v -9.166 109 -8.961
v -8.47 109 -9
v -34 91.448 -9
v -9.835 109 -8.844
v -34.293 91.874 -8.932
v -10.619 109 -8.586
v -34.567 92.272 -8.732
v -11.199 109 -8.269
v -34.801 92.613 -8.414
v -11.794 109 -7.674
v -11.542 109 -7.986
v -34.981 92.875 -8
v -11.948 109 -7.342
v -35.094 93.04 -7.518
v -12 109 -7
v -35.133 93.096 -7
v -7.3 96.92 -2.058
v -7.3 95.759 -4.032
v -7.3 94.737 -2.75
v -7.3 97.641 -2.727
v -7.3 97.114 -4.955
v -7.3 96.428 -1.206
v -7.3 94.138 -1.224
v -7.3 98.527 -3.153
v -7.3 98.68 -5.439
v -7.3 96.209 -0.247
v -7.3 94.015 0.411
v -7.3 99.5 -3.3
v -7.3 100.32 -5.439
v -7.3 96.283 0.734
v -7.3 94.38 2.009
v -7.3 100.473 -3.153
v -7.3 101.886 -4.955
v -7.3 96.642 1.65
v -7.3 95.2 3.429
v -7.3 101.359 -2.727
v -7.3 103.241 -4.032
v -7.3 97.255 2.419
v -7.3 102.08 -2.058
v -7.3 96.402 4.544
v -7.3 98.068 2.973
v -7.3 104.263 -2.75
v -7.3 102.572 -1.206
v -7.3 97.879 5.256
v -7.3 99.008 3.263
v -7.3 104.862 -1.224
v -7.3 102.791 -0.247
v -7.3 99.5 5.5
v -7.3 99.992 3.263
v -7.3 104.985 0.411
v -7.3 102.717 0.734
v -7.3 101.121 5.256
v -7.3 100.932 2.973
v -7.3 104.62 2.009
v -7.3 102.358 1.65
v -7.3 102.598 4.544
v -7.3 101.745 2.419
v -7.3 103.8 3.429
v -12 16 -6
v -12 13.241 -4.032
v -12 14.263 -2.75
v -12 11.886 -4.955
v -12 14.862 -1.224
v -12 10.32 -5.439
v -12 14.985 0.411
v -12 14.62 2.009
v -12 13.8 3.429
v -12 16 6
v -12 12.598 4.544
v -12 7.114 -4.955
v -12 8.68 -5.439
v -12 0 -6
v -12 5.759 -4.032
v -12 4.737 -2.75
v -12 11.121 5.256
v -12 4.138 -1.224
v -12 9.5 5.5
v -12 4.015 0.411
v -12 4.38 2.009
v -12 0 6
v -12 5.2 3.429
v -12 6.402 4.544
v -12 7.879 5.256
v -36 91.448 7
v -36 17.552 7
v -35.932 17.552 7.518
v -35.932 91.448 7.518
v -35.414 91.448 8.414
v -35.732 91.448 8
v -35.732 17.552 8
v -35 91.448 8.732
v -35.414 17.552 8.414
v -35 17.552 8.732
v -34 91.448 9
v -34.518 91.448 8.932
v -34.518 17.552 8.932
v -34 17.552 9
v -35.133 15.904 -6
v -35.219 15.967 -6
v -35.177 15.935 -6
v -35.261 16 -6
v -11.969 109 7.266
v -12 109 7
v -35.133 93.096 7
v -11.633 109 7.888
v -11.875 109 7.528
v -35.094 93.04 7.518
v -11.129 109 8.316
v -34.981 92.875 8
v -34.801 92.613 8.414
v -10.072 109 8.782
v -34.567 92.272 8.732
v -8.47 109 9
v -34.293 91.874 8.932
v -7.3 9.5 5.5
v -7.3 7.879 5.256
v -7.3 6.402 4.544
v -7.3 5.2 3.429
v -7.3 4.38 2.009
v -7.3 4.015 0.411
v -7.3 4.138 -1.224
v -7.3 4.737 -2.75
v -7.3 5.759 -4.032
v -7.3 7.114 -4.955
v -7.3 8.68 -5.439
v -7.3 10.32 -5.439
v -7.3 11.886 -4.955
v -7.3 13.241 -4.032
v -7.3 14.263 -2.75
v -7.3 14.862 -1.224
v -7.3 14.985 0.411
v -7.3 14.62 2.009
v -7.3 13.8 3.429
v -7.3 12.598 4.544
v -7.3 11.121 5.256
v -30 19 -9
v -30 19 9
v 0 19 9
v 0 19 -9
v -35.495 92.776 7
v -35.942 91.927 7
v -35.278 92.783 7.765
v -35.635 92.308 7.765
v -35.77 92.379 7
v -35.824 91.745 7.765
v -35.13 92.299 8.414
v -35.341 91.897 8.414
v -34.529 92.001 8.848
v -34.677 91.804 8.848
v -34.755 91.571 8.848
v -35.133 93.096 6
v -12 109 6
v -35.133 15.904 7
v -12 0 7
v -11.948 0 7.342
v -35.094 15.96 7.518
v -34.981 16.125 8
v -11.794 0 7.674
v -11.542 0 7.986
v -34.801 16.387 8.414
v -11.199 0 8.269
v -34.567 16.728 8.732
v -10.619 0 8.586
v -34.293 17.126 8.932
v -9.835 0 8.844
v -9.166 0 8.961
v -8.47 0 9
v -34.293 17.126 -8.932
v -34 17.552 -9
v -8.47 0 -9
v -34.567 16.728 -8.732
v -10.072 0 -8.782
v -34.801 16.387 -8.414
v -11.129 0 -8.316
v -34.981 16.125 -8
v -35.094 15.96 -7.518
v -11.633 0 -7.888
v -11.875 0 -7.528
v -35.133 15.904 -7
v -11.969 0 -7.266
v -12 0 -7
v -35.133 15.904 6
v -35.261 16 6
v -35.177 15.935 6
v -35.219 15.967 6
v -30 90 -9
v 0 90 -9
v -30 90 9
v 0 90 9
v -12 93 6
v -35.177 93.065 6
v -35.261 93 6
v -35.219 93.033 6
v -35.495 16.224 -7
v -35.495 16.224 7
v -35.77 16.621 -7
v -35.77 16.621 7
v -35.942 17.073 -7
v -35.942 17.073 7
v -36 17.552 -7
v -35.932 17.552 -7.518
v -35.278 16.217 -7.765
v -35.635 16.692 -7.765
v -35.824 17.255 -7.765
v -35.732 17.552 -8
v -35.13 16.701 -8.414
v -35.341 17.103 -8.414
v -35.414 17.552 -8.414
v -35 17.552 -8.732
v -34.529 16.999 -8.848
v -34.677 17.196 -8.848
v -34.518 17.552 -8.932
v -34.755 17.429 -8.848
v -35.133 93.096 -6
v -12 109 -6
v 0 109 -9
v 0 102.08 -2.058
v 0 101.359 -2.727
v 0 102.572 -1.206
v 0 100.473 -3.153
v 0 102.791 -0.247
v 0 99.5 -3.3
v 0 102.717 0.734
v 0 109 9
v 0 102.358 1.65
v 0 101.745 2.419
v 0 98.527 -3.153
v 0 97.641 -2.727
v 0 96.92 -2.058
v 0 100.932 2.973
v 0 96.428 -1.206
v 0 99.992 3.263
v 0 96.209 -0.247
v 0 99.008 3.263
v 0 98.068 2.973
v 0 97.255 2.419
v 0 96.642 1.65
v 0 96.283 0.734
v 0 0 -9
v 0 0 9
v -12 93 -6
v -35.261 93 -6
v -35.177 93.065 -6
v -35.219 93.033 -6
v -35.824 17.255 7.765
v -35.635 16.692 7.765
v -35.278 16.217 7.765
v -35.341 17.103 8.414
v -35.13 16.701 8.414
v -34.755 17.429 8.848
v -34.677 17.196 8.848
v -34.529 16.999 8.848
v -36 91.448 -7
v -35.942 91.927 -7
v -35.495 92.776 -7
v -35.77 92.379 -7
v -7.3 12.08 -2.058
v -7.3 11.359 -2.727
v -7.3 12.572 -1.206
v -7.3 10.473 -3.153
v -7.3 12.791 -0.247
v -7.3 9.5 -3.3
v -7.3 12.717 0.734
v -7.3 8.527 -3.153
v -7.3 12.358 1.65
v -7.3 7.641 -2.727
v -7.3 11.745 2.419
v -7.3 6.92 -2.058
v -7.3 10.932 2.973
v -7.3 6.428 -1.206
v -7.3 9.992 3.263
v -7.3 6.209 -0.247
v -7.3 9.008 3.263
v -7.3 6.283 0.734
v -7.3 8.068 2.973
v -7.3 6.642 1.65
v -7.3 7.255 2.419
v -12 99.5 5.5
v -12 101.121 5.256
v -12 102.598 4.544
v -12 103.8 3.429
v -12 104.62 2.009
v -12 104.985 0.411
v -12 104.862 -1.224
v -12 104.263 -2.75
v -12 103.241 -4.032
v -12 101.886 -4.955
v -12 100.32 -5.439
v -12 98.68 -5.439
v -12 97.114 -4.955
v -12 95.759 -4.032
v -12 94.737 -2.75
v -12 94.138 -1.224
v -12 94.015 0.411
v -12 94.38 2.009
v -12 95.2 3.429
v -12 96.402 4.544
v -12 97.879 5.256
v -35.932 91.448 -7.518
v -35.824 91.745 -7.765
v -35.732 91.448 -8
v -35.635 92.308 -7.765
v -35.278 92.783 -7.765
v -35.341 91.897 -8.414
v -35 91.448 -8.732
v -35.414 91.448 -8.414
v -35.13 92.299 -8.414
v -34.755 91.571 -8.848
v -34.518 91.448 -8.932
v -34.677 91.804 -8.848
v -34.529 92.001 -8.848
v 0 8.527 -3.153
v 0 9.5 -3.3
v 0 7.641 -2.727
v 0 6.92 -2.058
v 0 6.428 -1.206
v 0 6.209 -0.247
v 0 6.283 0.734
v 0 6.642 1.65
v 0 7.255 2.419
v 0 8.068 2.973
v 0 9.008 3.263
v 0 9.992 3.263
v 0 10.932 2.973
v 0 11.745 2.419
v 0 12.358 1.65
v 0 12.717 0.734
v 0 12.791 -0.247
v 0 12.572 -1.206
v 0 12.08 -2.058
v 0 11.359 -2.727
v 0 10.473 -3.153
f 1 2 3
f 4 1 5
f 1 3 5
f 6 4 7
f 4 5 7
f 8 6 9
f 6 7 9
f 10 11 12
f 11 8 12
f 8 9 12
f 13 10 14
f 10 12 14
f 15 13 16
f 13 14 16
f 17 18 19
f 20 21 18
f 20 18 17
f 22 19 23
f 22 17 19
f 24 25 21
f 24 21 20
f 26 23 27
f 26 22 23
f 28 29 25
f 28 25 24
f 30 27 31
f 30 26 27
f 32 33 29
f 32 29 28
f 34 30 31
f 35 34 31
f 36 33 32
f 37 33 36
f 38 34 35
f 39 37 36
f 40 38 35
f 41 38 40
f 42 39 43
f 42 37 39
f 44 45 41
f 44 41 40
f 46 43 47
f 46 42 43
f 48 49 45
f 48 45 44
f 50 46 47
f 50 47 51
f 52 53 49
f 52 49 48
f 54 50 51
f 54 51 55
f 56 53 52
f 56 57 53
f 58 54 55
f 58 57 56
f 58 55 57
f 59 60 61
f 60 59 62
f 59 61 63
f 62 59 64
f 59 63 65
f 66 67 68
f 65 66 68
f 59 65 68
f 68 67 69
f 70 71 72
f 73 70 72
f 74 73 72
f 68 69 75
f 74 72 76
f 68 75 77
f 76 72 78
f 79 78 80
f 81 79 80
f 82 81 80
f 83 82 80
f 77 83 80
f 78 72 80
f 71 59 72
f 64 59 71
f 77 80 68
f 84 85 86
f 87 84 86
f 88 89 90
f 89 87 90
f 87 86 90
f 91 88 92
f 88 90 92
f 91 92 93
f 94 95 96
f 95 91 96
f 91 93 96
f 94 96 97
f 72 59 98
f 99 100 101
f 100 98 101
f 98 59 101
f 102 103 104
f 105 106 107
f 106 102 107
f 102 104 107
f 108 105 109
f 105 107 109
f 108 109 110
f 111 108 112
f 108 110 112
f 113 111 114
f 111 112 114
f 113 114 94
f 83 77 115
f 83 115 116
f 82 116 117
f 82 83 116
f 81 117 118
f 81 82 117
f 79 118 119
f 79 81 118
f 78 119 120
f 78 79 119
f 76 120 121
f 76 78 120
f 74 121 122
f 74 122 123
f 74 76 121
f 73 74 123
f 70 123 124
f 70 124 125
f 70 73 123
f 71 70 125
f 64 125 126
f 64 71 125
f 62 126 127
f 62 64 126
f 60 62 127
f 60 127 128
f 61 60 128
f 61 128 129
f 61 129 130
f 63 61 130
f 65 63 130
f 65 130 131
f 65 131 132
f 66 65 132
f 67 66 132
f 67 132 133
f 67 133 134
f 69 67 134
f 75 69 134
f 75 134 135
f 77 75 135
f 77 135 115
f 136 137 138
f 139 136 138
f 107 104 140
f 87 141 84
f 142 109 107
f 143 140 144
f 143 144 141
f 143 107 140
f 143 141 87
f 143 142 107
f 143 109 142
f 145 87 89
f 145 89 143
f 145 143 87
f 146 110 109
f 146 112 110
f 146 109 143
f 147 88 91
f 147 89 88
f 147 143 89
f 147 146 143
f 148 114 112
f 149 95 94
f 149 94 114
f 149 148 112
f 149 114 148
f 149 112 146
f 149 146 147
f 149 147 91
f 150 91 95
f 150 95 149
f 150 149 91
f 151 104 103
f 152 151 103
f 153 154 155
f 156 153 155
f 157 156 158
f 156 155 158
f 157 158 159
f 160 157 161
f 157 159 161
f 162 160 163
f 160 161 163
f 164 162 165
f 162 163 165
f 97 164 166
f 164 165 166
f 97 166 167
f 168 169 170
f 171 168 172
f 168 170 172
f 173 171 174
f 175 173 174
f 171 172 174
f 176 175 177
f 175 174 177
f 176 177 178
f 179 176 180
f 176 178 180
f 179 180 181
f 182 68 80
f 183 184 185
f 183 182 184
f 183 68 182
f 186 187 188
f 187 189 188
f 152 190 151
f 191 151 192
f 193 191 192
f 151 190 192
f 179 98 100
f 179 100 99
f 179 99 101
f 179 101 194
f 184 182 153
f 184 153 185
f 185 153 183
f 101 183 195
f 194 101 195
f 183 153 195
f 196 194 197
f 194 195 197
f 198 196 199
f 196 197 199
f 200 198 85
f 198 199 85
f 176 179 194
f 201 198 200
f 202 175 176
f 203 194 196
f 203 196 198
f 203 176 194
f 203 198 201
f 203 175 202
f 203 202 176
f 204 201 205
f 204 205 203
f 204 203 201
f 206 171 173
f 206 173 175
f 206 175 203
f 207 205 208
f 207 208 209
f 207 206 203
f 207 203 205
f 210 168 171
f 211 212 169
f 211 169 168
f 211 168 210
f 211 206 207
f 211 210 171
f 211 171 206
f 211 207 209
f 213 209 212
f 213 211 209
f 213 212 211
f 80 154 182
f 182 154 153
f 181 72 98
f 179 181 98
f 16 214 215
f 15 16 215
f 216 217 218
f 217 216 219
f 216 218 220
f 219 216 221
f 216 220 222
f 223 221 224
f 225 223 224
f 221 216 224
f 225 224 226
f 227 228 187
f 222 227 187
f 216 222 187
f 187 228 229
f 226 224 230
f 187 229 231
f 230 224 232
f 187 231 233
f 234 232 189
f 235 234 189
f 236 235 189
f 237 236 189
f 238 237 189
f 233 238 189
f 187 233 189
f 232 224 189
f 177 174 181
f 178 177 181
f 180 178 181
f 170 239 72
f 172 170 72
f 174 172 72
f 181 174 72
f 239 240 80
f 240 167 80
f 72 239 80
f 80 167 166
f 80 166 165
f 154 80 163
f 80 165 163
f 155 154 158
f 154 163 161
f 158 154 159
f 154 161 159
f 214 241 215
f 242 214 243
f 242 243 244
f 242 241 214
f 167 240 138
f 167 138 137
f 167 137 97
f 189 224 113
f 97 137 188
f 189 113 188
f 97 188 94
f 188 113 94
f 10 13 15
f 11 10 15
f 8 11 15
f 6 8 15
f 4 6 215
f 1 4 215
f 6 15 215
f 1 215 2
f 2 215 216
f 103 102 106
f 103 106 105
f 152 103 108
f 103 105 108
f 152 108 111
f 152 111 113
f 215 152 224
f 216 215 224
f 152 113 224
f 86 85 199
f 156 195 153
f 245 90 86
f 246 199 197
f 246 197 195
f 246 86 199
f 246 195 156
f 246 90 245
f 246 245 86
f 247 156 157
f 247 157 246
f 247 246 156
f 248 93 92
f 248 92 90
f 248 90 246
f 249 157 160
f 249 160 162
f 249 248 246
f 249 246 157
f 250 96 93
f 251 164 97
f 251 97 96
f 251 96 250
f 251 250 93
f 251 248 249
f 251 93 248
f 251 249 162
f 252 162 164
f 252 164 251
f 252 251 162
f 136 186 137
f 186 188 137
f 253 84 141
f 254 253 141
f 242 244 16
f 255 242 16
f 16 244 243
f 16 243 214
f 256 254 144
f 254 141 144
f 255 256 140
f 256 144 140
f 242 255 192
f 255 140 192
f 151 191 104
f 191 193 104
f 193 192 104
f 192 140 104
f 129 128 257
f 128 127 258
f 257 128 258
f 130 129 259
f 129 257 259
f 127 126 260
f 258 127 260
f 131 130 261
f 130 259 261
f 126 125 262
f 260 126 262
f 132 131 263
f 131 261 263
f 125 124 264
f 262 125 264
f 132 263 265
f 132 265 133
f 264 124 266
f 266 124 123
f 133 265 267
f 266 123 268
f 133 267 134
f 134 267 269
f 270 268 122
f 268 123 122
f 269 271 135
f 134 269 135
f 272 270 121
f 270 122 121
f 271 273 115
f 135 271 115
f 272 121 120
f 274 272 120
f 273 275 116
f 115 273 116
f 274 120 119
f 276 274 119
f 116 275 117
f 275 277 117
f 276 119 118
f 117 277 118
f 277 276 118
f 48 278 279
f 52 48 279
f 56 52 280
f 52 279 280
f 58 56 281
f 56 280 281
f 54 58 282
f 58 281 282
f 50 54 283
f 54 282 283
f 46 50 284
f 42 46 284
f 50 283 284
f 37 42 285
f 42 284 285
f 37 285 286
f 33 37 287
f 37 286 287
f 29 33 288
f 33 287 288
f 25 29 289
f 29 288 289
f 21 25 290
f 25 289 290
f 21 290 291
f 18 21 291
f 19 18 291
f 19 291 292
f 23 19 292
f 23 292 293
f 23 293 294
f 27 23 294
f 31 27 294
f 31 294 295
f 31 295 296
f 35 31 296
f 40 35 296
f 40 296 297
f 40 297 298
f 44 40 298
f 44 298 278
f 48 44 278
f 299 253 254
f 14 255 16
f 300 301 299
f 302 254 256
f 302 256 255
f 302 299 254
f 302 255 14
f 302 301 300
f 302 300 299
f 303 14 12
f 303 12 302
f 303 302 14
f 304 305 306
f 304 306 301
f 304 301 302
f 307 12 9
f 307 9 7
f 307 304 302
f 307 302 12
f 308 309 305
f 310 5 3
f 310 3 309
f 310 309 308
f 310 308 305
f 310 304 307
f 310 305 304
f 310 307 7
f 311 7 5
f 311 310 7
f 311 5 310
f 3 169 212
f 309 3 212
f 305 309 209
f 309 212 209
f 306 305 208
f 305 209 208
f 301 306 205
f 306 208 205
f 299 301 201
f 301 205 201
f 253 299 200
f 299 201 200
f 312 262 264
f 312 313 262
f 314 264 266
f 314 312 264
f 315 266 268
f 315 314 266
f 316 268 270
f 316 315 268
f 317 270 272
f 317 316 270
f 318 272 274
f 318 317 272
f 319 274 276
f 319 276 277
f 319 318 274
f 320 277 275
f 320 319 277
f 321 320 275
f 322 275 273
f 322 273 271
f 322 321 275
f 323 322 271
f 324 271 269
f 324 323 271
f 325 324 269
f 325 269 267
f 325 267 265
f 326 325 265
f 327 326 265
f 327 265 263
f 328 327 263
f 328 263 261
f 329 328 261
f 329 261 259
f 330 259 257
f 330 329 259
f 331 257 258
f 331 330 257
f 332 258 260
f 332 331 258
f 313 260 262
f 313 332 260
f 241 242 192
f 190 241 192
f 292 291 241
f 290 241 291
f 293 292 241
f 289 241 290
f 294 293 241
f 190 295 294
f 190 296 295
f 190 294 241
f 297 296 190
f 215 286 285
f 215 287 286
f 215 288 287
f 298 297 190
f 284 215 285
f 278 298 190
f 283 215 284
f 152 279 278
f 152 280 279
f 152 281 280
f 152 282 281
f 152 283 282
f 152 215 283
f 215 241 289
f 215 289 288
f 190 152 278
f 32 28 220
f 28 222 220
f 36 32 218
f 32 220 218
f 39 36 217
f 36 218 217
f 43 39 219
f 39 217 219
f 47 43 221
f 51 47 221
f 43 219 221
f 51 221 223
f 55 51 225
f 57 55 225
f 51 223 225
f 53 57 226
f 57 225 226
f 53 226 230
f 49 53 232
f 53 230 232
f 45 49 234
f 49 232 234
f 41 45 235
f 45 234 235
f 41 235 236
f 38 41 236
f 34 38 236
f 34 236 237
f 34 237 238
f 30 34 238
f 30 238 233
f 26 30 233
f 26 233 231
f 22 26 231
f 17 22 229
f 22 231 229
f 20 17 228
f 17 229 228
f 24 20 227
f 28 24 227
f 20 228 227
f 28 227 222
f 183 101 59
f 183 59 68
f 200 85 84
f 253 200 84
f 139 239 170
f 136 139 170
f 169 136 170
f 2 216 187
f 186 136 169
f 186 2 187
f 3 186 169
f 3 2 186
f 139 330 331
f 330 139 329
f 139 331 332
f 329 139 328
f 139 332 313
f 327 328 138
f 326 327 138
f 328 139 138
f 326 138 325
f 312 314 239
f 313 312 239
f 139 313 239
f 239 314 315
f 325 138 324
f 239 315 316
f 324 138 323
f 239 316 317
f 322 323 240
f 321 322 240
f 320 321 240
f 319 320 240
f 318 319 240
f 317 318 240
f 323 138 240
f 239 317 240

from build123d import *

# Parameters (mm, degrees)
EXTRUDE_1_DEPTH               = 9
SKETCH_2_W                    = 12
SKETCH_2_H                    = 16
CUT_EXTRUDE_1_DEPTH           = 24
HOLE_WIZARD_4_8_1_D           = 6.6
HOLE_WIZARD_4_8_1_CBORE_D     = 11
HOLE_WIZARD_4_8_1_CBORE_DEPTH = 4.7
FILLET_1_R                    = 2


with BuildPart() as part:
    # 草图1 → 凸台-拉伸1 (new, symmetric)
    with BuildSketch(Plane.XY):
        Polygon((0, 0), (-12, 0), (-36, 16.5), (-36, 92.5), (-12, 109), (0, 109), (0, 90), (-30, 90), (-30, 19), (0, 19), align=None)
    extrude(amount=EXTRUDE_1_DEPTH, both=True)

    # 草图2 → 切除-拉伸1 (cut)
    with BuildSketch(Plane.ZY.offset(36)):
        with Locations((0, 101)):
            Rectangle(SKETCH_2_W, SKETCH_2_H)
    cut_extrude_1 = extrude(amount=-CUT_EXTRUDE_1_DEPTH, mode=Mode.SUBTRACT)

    # 打孔尺寸根据内六角花形圆柱头螺钉-4.8级的类型1 (through all)
    with Locations(Plane.ZY.offset(12)):
        with Locations((0, 99.5)):
            hole_wizard_4_8_1 = CounterBoreHole(HOLE_WIZARD_4_8_1_D / 2, HOLE_WIZARD_4_8_1_CBORE_D / 2, HOLE_WIZARD_4_8_1_CBORE_DEPTH)

    # 镜向1: 切除-拉伸1, 打孔尺寸根据内六角花形圆柱头螺钉-4.8级的类型1 across plane
    add(cut_extrude_1.mirror(Plane.ZX.offset(54.5)), mode=Mode.SUBTRACT)
    add(hole_wizard_4_8_1.mirror(Plane.ZX.offset(54.5)), mode=Mode.SUBTRACT)

    # 圆角1
    # the kernel refuses this fillet: 2 mm, written as the material it takes off along each edge
    with BuildSketch(Plane(origin=(-34, 91.44793902, -7), x_dir=(-1, 0, 0), z_dir=(0, 0, -1))) as fillet_1_piece_1_section:
        Polygon((0, 0), (FILLET_1_R, 0), (FILLET_1_R, FILLET_1_R * 0.526030489934), (FILLET_1_R * 0.566528822887, FILLET_1_R * 0.824041924199), align=None)
    fillet_1_piece_1 = extrude(amount=FILLET_1_R, mode=Mode.PRIVATE)
    fillet_1_piece_1 = fillet_1_piece_1 - Plane(origin=(-34, 91.44793902, -7), x_dir=(0.8850222660721778, -0.46554869622464556, 0), z_dir=(0, 0, -1)) * Sphere(FILLET_1_R, mode=Mode.PRIVATE)
    add(fillet_1_piece_1, mode=Mode.SUBTRACT)
    with BuildSketch(Plane(origin=(-34, 91.44793902, 7), x_dir=(-1, 0, 0), z_dir=(0, 0, 1))) as fillet_1_piece_2_section:
        Polygon((0, 0), (FILLET_1_R, 0), (FILLET_1_R, -FILLET_1_R * 0.526030489934), (FILLET_1_R * 0.566528822887, -FILLET_1_R * 0.824041924199), align=None)
    fillet_1_piece_2 = extrude(amount=FILLET_1_R, mode=Mode.PRIVATE)
    fillet_1_piece_2 = fillet_1_piece_2 - Plane(origin=(-34, 91.44793902, 7), x_dir=(0.8850222660721778, -0.46554869622464556, 0), z_dir=(0, 0, 1)) * Sphere(FILLET_1_R, mode=Mode.PRIVATE)
    add(fillet_1_piece_2, mode=Mode.SUBTRACT)
    with BuildSketch(Plane(origin=(-34, 17.55206098, 7), x_dir=(-1, 0, 0), z_dir=(0, 0, 1))) as fillet_1_piece_3_section:
        Polygon((0, 0), (FILLET_1_R, 0), (FILLET_1_R, FILLET_1_R * 0.526030489934), (FILLET_1_R * 0.566528822887, FILLET_1_R * 0.824041924199), align=None)
    fillet_1_piece_3 = extrude(amount=FILLET_1_R, mode=Mode.PRIVATE)
    fillet_1_piece_3 = fillet_1_piece_3 - Plane(origin=(-34, 17.55206098, 7), x_dir=(0.8850222660721778, 0.46554869622464556, 0), z_dir=(0, 0, 1)) * Sphere(FILLET_1_R, mode=Mode.PRIVATE)
    add(fillet_1_piece_3, mode=Mode.SUBTRACT)
    with BuildSketch(Plane(origin=(-34, 17.55206098, -7), x_dir=(-0.5665288228870655, -0.8240419241993675, 0), z_dir=(0, 0, -1))) as fillet_1_piece_4_section:
        Polygon((0, 0), (FILLET_1_R, 0), (FILLET_1_R, FILLET_1_R * 0.526030489934), (FILLET_1_R * 0.566528822887, FILLET_1_R * 0.824041924199), align=None)
    fillet_1_piece_4 = extrude(amount=FILLET_1_R, mode=Mode.PRIVATE)
    fillet_1_piece_4 = fillet_1_piece_4 - Plane(origin=(-34, 17.55206098, -7), x_dir=(0.8850222660721778, 0.46554869622464556, 0), z_dir=(0, 0, -1)) * Sphere(FILLET_1_R, mode=Mode.PRIVATE)
    add(fillet_1_piece_4, mode=Mode.SUBTRACT)
    with BuildSketch(Plane(origin=(-35.133057646, 93.096022869, -9), x_dir=(0.5665288228870655, -0.8240419241993674, 0), z_dir=(0.8240419241993675, 0.5665288228870655, 0)), Plane(origin=(-7.879790379, -2.832644114, 9), x_dir=(0, 0, -1), z_dir=(-0.8240419241993675, 0.5665288228870655, 0)), Plane(origin=(-7.879790379, -2.832644114, -9), x_dir=(0.5665288228870655, 0.8240419241993675, 0), z_dir=(-0.8240419241993675, 0.5665288228870655, 0))) as fillet_1_piece_5:
        with BuildLine():
            CenterArc((FILLET_1_R, -FILLET_1_R), FILLET_1_R, 90, 90)
            Line((0, -FILLET_1_R), (0, 0))
            Line((0, 0), (FILLET_1_R, 0))
        make_face()
    extrude(amount=33.072670779, mode=Mode.SUBTRACT)
    with BuildSketch(Plane(origin=(-35.133057646, 93.096022869, 9), x_dir=(0.5665288228870655, -0.8240419241993674, 0), z_dir=(0.8240419241993675, 0.5665288228870655, 0))) as fillet_1_piece_6:
        with BuildLine():
            CenterArc((FILLET_1_R, FILLET_1_R), FILLET_1_R, 180, 90)
            Line((0, FILLET_1_R), (0, 0))
            Line((0, 0), (FILLET_1_R, 0))
        make_face()
    extrude(amount=33.072670779, mode=Mode.SUBTRACT)
    with BuildSketch(Plane(origin=(-36, 92.5, 7), x_dir=(0, -1, 0), z_dir=(0, 0, -1)), Plane(origin=(-36, 16.5, 7), x_dir=(0.8240419241993692, -0.566528822887063, 0), z_dir=(0, 0, -1))) as fillet_1_piece_7:
        with BuildLine():
            CenterArc((FILLET_1_R * 0.526030489934, -FILLET_1_R), FILLET_1_R, 90, 55.491477012)
            Line((-FILLET_1_R * 0.298011434265, -FILLET_1_R * 0.433471177113), (0, 0))
            Line((0, 0), (FILLET_1_R * 0.526030489934, 0))
        make_face()
    extrude(amount=14, mode=Mode.SUBTRACT)
    with BuildSketch(Plane(origin=(-36, 17.55206098, -9), x_dir=(1, 0, 0), z_dir=(0, 1, 0))) as fillet_1_piece_8:
        with BuildLine():
            CenterArc((FILLET_1_R, -FILLET_1_R), FILLET_1_R, 90, 90)
            Line((0, -FILLET_1_R), (0, 0))
            Line((0, 0), (FILLET_1_R, 0))
        make_face()
    extrude(amount=73.89587804, mode=Mode.SUBTRACT)
    with BuildSketch(Plane(origin=(-36, 17.55206098, 9), x_dir=(1, 0, 0), z_dir=(0, 1, 0))) as fillet_1_piece_9:
        with BuildLine():
            CenterArc((FILLET_1_R, FILLET_1_R), FILLET_1_R, 180, 90)
            Line((0, FILLET_1_R), (0, 0))
            Line((0, 0), (FILLET_1_R, 0))
        make_face()
    extrude(amount=73.89587804, mode=Mode.SUBTRACT)


solid = part.part
